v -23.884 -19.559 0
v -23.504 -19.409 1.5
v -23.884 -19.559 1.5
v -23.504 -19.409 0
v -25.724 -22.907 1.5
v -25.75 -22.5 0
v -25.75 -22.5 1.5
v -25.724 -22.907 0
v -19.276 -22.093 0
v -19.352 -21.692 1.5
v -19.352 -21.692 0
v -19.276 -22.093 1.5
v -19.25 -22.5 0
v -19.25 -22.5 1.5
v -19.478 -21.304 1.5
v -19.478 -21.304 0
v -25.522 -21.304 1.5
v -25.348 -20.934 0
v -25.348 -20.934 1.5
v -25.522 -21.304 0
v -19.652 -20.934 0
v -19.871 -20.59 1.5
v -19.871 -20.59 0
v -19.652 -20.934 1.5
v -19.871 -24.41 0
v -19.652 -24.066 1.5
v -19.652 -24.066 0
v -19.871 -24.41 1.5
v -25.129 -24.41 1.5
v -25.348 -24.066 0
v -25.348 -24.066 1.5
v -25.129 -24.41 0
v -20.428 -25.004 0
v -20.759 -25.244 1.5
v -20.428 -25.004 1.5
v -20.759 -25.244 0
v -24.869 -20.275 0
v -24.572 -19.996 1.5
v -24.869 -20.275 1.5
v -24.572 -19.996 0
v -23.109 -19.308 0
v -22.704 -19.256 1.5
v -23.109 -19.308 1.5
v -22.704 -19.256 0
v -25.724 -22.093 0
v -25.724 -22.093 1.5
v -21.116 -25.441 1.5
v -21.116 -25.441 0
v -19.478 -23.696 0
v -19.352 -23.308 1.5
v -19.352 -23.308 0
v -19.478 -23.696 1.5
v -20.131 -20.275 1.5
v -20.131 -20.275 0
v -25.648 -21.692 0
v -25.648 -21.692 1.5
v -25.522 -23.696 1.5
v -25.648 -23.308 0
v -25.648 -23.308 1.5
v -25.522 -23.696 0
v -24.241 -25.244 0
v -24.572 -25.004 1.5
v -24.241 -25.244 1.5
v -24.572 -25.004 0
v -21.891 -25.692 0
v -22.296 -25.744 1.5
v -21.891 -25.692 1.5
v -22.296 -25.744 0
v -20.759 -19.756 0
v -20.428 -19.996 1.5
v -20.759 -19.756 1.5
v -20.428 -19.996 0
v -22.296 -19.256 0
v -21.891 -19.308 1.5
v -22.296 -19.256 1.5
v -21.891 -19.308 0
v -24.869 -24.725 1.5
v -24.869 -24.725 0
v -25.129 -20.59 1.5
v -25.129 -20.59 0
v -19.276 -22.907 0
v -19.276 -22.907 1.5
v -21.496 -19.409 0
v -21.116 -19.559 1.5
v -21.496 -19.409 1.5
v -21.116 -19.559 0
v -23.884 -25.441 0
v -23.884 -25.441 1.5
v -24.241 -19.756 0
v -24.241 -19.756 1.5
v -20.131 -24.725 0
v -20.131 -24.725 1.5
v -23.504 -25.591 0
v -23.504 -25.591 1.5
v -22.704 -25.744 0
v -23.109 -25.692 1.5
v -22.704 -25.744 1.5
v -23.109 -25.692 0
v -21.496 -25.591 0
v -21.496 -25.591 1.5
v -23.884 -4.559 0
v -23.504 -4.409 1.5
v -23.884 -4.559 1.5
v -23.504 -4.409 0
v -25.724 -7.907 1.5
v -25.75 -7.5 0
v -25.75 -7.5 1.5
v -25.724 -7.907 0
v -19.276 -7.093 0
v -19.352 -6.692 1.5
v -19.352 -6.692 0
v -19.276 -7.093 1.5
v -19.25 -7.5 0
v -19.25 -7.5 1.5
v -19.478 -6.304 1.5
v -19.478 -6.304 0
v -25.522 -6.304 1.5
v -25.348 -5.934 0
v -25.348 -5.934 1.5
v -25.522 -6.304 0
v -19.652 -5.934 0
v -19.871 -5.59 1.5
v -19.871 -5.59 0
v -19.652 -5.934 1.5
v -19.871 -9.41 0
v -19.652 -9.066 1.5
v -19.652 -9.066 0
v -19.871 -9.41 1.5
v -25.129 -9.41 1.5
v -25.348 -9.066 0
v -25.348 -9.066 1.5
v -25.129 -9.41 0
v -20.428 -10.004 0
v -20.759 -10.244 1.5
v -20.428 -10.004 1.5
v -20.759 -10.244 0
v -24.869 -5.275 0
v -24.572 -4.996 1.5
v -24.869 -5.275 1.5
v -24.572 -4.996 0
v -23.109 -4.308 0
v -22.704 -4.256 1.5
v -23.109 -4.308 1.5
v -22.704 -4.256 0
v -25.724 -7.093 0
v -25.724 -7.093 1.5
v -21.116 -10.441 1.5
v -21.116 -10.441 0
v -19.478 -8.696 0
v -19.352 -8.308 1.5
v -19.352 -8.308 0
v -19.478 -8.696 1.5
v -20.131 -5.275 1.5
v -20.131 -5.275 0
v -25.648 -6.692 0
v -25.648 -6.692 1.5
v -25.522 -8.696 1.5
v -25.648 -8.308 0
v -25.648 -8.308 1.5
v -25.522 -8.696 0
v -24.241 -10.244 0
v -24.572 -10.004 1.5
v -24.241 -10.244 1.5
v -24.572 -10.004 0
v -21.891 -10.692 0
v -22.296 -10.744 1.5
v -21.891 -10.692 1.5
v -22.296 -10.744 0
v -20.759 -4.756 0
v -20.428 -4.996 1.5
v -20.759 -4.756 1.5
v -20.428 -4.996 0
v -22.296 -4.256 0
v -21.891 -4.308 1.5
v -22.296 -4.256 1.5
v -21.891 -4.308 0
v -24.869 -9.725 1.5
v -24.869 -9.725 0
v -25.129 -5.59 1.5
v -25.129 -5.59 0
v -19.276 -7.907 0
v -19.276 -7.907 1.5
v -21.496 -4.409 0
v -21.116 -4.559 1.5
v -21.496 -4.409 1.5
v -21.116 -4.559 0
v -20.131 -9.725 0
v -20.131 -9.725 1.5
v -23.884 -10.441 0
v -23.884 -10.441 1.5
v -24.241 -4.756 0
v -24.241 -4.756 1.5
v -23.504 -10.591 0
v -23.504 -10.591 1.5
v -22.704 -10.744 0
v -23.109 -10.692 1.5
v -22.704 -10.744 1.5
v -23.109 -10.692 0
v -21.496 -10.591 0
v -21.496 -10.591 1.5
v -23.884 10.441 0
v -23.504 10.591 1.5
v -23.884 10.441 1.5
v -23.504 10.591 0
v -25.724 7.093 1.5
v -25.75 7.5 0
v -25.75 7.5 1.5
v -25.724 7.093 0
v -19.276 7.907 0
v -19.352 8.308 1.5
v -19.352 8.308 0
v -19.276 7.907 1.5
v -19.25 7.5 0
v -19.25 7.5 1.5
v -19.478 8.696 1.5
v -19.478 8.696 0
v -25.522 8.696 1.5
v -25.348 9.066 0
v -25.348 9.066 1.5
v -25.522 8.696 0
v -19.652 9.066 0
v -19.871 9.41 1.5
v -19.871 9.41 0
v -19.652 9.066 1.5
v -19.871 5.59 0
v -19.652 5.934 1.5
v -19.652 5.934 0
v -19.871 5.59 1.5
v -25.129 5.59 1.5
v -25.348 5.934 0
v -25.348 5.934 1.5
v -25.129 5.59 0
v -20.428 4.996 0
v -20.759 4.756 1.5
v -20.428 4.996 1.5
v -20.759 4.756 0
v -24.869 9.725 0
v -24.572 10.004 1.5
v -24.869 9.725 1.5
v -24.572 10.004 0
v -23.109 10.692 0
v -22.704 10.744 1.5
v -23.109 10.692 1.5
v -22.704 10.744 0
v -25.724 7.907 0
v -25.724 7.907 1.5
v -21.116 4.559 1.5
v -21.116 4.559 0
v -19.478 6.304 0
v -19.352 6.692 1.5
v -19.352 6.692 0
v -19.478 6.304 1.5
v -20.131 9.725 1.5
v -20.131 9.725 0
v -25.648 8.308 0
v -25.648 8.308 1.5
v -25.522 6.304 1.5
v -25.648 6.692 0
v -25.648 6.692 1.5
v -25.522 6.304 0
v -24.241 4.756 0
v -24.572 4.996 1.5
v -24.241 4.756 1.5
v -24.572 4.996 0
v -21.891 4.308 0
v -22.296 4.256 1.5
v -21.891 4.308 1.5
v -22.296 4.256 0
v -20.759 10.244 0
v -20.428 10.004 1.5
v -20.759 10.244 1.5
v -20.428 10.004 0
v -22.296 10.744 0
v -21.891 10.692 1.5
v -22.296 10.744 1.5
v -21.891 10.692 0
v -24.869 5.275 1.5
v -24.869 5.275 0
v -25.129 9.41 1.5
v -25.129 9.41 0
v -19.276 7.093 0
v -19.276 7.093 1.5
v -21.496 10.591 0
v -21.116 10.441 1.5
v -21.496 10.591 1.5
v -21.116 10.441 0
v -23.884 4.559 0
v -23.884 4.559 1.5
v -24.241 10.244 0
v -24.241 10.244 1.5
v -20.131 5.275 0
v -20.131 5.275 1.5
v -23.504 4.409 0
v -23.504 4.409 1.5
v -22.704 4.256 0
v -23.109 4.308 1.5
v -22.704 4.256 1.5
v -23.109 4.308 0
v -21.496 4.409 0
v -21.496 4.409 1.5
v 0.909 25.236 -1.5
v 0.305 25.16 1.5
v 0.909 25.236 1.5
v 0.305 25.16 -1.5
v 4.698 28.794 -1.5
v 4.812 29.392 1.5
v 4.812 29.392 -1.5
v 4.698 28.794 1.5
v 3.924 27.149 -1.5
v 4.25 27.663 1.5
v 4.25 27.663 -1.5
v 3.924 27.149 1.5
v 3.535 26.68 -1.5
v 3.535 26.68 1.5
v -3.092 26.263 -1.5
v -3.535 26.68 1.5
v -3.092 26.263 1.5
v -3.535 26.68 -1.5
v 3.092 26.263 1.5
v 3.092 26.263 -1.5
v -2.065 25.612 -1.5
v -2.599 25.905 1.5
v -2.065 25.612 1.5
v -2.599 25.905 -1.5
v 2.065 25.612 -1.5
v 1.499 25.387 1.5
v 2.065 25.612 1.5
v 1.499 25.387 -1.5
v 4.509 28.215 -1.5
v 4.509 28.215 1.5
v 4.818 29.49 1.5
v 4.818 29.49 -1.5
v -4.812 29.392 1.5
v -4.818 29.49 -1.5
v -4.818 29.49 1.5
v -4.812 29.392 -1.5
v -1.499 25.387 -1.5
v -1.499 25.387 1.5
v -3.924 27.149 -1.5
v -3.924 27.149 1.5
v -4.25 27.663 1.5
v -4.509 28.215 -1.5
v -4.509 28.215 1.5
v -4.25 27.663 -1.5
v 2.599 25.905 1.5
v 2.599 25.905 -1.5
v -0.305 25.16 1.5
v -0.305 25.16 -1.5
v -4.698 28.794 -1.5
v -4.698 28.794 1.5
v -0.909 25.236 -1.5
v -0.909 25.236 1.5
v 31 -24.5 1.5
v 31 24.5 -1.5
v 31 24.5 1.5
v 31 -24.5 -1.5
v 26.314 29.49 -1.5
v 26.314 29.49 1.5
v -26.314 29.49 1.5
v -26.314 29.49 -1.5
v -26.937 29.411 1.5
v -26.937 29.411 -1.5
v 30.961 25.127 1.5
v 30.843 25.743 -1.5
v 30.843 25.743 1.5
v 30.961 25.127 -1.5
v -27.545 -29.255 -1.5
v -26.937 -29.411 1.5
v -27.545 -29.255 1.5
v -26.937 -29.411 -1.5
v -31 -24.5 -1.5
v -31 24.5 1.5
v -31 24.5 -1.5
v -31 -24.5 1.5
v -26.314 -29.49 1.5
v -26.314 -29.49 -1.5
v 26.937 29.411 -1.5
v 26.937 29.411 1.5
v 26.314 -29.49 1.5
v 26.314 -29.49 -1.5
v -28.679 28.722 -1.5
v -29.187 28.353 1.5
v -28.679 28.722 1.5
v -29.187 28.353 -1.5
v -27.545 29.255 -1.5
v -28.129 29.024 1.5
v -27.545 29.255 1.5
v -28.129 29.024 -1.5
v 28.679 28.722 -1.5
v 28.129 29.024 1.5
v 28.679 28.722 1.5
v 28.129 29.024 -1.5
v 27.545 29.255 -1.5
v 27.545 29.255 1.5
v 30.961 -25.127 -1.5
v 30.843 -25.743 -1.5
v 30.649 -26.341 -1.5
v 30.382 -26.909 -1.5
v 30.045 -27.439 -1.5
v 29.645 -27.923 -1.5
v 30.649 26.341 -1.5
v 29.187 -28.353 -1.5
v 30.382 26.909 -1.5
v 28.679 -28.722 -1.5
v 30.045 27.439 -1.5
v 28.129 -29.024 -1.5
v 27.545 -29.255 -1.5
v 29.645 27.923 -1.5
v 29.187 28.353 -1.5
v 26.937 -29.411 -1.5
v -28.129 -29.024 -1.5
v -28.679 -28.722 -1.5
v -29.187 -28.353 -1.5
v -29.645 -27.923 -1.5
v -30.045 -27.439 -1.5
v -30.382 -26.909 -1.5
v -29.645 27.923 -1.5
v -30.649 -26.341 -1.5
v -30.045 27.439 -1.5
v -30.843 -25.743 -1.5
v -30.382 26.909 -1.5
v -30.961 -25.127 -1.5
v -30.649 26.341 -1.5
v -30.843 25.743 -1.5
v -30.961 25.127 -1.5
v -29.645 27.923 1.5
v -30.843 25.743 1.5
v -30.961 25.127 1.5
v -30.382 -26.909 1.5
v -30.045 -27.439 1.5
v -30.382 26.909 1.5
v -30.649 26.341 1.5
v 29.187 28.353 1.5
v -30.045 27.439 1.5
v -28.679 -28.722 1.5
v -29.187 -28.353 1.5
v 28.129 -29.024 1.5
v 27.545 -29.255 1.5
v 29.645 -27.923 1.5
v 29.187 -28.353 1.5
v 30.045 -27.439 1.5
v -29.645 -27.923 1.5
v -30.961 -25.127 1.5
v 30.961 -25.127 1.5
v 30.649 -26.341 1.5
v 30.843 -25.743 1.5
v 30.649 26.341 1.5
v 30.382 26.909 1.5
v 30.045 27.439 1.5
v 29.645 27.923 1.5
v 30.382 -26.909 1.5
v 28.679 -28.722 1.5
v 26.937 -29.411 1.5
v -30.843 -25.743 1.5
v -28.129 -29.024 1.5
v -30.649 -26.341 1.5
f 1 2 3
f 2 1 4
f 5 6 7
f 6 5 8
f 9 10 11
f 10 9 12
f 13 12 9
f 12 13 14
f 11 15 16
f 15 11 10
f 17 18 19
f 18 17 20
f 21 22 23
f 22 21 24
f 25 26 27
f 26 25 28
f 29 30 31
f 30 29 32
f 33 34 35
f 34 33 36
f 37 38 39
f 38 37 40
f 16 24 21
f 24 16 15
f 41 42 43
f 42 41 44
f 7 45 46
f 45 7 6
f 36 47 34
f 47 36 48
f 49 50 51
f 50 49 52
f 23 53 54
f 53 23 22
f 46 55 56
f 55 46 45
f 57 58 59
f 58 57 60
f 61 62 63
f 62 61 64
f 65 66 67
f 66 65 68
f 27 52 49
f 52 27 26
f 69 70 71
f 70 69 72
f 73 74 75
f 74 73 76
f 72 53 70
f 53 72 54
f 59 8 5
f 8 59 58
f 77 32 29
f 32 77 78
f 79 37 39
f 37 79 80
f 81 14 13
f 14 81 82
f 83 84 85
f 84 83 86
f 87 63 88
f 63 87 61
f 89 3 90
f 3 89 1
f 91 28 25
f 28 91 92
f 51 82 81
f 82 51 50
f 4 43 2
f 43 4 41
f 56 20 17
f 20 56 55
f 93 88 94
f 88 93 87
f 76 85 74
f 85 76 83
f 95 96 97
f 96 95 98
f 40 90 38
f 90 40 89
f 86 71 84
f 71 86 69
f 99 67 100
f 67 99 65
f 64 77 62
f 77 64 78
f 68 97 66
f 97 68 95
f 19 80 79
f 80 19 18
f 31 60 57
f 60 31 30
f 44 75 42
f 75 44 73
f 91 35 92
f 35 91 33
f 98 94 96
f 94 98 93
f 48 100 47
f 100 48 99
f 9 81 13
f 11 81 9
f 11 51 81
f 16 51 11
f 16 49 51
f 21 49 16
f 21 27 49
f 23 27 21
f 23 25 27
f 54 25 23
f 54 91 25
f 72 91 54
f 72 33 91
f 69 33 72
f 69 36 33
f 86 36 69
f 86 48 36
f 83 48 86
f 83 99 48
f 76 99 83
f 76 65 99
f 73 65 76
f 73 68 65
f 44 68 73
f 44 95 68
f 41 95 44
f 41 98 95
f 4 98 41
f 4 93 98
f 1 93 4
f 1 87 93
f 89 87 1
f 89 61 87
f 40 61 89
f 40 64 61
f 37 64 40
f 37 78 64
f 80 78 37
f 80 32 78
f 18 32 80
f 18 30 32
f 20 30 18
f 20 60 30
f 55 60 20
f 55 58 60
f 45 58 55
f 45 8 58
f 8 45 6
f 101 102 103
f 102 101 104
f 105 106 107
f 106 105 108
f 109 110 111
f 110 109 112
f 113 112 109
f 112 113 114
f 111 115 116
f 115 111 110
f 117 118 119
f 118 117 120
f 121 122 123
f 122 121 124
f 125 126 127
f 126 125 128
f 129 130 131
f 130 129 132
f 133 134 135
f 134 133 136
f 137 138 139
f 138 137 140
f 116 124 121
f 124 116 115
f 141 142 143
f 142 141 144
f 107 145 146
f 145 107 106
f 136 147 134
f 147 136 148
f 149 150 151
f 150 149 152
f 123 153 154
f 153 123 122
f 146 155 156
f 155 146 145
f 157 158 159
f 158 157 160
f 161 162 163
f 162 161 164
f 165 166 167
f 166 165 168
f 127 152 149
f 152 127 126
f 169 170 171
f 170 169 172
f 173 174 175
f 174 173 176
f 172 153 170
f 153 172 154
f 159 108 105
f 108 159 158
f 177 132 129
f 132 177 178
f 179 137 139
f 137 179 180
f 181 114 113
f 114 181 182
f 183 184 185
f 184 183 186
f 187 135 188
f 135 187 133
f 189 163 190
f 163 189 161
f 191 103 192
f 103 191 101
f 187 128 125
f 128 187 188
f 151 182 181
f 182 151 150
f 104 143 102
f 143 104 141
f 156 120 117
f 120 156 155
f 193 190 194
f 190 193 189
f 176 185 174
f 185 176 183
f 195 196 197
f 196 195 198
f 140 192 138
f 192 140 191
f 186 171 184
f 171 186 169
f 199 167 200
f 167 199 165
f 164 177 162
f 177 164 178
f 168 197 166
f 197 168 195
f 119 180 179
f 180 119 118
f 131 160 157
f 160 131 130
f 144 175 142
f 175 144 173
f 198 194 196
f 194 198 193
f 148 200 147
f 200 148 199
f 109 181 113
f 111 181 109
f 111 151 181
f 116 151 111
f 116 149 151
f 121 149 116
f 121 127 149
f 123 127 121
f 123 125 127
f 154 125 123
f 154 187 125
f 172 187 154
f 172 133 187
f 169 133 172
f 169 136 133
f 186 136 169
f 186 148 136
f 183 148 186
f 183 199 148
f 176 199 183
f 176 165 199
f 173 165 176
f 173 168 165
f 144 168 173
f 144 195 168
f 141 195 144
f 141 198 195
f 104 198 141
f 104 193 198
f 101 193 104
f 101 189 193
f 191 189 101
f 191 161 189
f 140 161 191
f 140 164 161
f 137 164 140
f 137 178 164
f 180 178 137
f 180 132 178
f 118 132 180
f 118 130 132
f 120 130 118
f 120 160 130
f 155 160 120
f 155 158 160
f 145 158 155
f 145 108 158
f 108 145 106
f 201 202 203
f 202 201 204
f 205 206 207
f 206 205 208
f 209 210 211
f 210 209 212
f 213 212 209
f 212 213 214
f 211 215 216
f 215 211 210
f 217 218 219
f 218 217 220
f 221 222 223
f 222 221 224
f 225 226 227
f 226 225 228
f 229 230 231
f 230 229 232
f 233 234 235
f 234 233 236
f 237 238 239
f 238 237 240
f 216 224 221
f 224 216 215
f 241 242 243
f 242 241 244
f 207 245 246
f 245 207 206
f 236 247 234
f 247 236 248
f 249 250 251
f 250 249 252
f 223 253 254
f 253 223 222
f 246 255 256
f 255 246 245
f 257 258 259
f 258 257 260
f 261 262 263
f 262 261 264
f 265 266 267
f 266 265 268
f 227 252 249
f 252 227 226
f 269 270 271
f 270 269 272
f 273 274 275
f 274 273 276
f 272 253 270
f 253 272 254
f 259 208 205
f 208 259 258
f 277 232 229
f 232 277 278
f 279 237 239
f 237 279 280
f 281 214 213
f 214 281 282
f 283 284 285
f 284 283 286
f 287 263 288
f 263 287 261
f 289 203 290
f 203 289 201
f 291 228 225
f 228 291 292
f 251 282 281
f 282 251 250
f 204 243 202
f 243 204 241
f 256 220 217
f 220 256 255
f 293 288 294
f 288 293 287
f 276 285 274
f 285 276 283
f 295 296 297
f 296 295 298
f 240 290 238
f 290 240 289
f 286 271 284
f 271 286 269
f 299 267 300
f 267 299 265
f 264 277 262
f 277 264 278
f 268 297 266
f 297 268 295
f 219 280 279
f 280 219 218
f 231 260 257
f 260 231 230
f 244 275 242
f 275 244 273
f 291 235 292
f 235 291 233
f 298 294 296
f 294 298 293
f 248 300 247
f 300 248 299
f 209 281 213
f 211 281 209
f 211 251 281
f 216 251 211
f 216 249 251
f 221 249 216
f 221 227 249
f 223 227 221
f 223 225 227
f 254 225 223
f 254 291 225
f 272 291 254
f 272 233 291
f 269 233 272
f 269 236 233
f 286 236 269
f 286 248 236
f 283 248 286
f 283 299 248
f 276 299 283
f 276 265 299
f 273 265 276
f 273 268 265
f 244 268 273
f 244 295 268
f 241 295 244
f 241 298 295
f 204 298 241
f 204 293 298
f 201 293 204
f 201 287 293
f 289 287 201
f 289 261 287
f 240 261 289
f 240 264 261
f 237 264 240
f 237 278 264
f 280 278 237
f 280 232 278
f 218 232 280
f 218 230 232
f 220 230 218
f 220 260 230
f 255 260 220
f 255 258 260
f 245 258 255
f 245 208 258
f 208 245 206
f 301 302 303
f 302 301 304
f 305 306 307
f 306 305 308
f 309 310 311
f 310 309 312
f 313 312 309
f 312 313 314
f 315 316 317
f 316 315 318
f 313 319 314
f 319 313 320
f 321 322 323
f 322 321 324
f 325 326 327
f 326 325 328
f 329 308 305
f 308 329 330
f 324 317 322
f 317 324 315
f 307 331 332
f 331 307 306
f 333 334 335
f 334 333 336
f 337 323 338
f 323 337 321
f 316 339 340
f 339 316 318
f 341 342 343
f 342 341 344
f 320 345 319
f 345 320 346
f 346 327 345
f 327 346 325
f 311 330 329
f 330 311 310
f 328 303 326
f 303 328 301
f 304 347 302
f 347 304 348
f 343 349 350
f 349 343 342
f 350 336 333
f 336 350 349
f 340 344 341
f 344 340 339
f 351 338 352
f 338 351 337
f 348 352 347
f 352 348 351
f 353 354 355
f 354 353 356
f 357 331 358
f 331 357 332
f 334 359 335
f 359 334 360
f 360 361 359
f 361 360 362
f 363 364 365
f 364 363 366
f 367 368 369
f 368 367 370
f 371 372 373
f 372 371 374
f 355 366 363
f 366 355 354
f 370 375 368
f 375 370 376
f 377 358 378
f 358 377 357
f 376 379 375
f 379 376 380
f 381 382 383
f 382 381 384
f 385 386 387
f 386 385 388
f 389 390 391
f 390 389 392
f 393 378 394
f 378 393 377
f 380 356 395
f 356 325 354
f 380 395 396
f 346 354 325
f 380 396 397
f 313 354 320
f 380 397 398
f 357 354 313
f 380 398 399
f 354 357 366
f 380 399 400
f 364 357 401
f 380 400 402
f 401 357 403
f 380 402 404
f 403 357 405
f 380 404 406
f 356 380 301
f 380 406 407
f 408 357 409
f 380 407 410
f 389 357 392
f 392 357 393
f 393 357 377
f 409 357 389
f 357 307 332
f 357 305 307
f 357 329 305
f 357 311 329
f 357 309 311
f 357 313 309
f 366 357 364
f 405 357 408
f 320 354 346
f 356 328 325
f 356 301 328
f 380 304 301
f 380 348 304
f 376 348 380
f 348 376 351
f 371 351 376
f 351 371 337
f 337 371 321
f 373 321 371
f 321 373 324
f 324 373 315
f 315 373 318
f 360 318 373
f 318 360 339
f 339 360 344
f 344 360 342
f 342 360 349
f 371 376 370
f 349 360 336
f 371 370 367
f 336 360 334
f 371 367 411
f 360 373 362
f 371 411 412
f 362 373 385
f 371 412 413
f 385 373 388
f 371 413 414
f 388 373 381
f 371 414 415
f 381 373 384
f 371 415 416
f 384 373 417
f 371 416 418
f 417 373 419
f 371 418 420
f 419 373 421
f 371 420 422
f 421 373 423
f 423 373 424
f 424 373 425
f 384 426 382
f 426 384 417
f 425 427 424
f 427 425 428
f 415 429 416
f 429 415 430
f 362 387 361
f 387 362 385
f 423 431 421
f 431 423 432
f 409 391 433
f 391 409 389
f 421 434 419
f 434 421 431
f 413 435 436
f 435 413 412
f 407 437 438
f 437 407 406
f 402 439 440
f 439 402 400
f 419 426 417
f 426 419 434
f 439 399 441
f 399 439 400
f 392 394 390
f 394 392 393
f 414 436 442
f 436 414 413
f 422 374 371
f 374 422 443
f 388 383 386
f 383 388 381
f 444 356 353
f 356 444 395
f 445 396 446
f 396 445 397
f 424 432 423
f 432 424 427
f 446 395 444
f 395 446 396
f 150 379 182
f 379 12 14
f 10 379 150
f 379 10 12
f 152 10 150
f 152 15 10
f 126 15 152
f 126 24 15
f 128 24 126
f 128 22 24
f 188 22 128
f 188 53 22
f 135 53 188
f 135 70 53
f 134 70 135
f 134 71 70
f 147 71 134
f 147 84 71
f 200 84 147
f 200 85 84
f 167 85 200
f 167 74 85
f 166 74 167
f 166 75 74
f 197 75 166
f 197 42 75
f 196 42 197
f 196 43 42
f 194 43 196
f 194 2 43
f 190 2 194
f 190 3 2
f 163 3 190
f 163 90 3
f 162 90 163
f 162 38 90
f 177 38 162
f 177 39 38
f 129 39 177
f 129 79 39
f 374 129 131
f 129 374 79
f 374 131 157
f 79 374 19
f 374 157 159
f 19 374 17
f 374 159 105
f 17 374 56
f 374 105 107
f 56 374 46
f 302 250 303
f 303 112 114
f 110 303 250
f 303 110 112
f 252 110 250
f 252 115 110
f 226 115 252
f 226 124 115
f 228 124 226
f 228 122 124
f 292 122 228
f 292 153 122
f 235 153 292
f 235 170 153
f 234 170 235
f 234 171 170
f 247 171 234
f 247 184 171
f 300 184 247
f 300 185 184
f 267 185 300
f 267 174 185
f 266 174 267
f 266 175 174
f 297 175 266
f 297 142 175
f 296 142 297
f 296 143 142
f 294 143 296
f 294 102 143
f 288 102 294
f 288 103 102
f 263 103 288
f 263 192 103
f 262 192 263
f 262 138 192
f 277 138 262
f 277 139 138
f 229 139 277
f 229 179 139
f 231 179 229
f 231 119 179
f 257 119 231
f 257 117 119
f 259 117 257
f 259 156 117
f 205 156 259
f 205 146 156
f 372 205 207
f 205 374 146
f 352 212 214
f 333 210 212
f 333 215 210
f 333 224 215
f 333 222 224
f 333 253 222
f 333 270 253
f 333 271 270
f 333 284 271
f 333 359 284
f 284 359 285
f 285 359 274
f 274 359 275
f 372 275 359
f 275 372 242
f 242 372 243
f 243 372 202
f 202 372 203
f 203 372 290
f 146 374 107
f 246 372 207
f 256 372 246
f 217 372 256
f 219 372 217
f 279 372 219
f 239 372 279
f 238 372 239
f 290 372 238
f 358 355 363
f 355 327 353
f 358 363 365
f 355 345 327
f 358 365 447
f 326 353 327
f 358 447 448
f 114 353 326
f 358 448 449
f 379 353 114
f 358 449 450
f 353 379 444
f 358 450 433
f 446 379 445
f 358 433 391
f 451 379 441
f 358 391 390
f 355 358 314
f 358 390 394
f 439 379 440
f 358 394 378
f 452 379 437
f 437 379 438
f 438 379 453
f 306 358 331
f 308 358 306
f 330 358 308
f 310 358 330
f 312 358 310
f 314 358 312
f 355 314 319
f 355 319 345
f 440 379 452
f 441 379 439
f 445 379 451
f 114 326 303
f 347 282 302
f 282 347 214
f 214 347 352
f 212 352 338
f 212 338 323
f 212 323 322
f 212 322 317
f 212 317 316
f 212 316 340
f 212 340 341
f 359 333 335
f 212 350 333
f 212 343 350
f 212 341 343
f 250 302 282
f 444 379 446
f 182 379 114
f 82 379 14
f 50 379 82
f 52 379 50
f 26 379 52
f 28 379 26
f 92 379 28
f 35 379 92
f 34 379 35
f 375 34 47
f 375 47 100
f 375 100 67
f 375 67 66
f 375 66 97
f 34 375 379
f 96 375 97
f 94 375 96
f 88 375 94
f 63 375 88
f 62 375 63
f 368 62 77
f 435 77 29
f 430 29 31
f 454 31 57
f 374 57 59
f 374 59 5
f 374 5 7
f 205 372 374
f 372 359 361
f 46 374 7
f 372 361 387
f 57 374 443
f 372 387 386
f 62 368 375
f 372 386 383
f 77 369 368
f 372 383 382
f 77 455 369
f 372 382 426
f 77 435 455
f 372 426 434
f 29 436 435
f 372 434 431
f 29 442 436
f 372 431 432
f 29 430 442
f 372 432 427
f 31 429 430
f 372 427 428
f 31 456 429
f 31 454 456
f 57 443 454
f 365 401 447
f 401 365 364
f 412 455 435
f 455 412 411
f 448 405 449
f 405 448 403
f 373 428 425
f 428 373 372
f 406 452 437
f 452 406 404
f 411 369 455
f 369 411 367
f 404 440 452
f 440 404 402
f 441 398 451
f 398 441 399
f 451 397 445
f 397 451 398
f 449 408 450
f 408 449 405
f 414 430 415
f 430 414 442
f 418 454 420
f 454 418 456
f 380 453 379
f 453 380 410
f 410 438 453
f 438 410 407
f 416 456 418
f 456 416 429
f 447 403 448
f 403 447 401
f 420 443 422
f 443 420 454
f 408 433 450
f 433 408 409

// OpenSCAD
$fn = 50;


difference() {
	union() {
		translate(v = [0, 0, -1.5000000000]) {
			hull() {
				translate(v = [-26.0000000000, 24.5000000000, 0]) {
					cylinder(h = 3, r = 5);
				}
				translate(v = [26.0000000000, 24.5000000000, 0]) {
					cylinder(h = 3, r = 5);
				}
				translate(v = [-26.0000000000, -24.5000000000, 0]) {
					cylinder(h = 3, r = 5);
				}
				translate(v = [26.0000000000, -24.5000000000, 0]) {
					cylinder(h = 3, r = 5);
				}
			}
		}
	}
	union() {
		translate(v = [-22.5000000000, -22.5000000000, 0]) {
			cylinder(h = 100, r = 3.2500000000);
		}
		translate(v = [-22.5000000000, -7.5000000000, 0]) {
			cylinder(h = 100, r = 3.2500000000);
		}
		translate(v = [-22.5000000000, 7.5000000000, 0]) {
			cylinder(h = 100, r = 3.2500000000);
		}
		translate(v = [0, 30, -100.0000000000]) {
			cylinder(h = 200, r = 4.8500000000);
		}
	}
}
